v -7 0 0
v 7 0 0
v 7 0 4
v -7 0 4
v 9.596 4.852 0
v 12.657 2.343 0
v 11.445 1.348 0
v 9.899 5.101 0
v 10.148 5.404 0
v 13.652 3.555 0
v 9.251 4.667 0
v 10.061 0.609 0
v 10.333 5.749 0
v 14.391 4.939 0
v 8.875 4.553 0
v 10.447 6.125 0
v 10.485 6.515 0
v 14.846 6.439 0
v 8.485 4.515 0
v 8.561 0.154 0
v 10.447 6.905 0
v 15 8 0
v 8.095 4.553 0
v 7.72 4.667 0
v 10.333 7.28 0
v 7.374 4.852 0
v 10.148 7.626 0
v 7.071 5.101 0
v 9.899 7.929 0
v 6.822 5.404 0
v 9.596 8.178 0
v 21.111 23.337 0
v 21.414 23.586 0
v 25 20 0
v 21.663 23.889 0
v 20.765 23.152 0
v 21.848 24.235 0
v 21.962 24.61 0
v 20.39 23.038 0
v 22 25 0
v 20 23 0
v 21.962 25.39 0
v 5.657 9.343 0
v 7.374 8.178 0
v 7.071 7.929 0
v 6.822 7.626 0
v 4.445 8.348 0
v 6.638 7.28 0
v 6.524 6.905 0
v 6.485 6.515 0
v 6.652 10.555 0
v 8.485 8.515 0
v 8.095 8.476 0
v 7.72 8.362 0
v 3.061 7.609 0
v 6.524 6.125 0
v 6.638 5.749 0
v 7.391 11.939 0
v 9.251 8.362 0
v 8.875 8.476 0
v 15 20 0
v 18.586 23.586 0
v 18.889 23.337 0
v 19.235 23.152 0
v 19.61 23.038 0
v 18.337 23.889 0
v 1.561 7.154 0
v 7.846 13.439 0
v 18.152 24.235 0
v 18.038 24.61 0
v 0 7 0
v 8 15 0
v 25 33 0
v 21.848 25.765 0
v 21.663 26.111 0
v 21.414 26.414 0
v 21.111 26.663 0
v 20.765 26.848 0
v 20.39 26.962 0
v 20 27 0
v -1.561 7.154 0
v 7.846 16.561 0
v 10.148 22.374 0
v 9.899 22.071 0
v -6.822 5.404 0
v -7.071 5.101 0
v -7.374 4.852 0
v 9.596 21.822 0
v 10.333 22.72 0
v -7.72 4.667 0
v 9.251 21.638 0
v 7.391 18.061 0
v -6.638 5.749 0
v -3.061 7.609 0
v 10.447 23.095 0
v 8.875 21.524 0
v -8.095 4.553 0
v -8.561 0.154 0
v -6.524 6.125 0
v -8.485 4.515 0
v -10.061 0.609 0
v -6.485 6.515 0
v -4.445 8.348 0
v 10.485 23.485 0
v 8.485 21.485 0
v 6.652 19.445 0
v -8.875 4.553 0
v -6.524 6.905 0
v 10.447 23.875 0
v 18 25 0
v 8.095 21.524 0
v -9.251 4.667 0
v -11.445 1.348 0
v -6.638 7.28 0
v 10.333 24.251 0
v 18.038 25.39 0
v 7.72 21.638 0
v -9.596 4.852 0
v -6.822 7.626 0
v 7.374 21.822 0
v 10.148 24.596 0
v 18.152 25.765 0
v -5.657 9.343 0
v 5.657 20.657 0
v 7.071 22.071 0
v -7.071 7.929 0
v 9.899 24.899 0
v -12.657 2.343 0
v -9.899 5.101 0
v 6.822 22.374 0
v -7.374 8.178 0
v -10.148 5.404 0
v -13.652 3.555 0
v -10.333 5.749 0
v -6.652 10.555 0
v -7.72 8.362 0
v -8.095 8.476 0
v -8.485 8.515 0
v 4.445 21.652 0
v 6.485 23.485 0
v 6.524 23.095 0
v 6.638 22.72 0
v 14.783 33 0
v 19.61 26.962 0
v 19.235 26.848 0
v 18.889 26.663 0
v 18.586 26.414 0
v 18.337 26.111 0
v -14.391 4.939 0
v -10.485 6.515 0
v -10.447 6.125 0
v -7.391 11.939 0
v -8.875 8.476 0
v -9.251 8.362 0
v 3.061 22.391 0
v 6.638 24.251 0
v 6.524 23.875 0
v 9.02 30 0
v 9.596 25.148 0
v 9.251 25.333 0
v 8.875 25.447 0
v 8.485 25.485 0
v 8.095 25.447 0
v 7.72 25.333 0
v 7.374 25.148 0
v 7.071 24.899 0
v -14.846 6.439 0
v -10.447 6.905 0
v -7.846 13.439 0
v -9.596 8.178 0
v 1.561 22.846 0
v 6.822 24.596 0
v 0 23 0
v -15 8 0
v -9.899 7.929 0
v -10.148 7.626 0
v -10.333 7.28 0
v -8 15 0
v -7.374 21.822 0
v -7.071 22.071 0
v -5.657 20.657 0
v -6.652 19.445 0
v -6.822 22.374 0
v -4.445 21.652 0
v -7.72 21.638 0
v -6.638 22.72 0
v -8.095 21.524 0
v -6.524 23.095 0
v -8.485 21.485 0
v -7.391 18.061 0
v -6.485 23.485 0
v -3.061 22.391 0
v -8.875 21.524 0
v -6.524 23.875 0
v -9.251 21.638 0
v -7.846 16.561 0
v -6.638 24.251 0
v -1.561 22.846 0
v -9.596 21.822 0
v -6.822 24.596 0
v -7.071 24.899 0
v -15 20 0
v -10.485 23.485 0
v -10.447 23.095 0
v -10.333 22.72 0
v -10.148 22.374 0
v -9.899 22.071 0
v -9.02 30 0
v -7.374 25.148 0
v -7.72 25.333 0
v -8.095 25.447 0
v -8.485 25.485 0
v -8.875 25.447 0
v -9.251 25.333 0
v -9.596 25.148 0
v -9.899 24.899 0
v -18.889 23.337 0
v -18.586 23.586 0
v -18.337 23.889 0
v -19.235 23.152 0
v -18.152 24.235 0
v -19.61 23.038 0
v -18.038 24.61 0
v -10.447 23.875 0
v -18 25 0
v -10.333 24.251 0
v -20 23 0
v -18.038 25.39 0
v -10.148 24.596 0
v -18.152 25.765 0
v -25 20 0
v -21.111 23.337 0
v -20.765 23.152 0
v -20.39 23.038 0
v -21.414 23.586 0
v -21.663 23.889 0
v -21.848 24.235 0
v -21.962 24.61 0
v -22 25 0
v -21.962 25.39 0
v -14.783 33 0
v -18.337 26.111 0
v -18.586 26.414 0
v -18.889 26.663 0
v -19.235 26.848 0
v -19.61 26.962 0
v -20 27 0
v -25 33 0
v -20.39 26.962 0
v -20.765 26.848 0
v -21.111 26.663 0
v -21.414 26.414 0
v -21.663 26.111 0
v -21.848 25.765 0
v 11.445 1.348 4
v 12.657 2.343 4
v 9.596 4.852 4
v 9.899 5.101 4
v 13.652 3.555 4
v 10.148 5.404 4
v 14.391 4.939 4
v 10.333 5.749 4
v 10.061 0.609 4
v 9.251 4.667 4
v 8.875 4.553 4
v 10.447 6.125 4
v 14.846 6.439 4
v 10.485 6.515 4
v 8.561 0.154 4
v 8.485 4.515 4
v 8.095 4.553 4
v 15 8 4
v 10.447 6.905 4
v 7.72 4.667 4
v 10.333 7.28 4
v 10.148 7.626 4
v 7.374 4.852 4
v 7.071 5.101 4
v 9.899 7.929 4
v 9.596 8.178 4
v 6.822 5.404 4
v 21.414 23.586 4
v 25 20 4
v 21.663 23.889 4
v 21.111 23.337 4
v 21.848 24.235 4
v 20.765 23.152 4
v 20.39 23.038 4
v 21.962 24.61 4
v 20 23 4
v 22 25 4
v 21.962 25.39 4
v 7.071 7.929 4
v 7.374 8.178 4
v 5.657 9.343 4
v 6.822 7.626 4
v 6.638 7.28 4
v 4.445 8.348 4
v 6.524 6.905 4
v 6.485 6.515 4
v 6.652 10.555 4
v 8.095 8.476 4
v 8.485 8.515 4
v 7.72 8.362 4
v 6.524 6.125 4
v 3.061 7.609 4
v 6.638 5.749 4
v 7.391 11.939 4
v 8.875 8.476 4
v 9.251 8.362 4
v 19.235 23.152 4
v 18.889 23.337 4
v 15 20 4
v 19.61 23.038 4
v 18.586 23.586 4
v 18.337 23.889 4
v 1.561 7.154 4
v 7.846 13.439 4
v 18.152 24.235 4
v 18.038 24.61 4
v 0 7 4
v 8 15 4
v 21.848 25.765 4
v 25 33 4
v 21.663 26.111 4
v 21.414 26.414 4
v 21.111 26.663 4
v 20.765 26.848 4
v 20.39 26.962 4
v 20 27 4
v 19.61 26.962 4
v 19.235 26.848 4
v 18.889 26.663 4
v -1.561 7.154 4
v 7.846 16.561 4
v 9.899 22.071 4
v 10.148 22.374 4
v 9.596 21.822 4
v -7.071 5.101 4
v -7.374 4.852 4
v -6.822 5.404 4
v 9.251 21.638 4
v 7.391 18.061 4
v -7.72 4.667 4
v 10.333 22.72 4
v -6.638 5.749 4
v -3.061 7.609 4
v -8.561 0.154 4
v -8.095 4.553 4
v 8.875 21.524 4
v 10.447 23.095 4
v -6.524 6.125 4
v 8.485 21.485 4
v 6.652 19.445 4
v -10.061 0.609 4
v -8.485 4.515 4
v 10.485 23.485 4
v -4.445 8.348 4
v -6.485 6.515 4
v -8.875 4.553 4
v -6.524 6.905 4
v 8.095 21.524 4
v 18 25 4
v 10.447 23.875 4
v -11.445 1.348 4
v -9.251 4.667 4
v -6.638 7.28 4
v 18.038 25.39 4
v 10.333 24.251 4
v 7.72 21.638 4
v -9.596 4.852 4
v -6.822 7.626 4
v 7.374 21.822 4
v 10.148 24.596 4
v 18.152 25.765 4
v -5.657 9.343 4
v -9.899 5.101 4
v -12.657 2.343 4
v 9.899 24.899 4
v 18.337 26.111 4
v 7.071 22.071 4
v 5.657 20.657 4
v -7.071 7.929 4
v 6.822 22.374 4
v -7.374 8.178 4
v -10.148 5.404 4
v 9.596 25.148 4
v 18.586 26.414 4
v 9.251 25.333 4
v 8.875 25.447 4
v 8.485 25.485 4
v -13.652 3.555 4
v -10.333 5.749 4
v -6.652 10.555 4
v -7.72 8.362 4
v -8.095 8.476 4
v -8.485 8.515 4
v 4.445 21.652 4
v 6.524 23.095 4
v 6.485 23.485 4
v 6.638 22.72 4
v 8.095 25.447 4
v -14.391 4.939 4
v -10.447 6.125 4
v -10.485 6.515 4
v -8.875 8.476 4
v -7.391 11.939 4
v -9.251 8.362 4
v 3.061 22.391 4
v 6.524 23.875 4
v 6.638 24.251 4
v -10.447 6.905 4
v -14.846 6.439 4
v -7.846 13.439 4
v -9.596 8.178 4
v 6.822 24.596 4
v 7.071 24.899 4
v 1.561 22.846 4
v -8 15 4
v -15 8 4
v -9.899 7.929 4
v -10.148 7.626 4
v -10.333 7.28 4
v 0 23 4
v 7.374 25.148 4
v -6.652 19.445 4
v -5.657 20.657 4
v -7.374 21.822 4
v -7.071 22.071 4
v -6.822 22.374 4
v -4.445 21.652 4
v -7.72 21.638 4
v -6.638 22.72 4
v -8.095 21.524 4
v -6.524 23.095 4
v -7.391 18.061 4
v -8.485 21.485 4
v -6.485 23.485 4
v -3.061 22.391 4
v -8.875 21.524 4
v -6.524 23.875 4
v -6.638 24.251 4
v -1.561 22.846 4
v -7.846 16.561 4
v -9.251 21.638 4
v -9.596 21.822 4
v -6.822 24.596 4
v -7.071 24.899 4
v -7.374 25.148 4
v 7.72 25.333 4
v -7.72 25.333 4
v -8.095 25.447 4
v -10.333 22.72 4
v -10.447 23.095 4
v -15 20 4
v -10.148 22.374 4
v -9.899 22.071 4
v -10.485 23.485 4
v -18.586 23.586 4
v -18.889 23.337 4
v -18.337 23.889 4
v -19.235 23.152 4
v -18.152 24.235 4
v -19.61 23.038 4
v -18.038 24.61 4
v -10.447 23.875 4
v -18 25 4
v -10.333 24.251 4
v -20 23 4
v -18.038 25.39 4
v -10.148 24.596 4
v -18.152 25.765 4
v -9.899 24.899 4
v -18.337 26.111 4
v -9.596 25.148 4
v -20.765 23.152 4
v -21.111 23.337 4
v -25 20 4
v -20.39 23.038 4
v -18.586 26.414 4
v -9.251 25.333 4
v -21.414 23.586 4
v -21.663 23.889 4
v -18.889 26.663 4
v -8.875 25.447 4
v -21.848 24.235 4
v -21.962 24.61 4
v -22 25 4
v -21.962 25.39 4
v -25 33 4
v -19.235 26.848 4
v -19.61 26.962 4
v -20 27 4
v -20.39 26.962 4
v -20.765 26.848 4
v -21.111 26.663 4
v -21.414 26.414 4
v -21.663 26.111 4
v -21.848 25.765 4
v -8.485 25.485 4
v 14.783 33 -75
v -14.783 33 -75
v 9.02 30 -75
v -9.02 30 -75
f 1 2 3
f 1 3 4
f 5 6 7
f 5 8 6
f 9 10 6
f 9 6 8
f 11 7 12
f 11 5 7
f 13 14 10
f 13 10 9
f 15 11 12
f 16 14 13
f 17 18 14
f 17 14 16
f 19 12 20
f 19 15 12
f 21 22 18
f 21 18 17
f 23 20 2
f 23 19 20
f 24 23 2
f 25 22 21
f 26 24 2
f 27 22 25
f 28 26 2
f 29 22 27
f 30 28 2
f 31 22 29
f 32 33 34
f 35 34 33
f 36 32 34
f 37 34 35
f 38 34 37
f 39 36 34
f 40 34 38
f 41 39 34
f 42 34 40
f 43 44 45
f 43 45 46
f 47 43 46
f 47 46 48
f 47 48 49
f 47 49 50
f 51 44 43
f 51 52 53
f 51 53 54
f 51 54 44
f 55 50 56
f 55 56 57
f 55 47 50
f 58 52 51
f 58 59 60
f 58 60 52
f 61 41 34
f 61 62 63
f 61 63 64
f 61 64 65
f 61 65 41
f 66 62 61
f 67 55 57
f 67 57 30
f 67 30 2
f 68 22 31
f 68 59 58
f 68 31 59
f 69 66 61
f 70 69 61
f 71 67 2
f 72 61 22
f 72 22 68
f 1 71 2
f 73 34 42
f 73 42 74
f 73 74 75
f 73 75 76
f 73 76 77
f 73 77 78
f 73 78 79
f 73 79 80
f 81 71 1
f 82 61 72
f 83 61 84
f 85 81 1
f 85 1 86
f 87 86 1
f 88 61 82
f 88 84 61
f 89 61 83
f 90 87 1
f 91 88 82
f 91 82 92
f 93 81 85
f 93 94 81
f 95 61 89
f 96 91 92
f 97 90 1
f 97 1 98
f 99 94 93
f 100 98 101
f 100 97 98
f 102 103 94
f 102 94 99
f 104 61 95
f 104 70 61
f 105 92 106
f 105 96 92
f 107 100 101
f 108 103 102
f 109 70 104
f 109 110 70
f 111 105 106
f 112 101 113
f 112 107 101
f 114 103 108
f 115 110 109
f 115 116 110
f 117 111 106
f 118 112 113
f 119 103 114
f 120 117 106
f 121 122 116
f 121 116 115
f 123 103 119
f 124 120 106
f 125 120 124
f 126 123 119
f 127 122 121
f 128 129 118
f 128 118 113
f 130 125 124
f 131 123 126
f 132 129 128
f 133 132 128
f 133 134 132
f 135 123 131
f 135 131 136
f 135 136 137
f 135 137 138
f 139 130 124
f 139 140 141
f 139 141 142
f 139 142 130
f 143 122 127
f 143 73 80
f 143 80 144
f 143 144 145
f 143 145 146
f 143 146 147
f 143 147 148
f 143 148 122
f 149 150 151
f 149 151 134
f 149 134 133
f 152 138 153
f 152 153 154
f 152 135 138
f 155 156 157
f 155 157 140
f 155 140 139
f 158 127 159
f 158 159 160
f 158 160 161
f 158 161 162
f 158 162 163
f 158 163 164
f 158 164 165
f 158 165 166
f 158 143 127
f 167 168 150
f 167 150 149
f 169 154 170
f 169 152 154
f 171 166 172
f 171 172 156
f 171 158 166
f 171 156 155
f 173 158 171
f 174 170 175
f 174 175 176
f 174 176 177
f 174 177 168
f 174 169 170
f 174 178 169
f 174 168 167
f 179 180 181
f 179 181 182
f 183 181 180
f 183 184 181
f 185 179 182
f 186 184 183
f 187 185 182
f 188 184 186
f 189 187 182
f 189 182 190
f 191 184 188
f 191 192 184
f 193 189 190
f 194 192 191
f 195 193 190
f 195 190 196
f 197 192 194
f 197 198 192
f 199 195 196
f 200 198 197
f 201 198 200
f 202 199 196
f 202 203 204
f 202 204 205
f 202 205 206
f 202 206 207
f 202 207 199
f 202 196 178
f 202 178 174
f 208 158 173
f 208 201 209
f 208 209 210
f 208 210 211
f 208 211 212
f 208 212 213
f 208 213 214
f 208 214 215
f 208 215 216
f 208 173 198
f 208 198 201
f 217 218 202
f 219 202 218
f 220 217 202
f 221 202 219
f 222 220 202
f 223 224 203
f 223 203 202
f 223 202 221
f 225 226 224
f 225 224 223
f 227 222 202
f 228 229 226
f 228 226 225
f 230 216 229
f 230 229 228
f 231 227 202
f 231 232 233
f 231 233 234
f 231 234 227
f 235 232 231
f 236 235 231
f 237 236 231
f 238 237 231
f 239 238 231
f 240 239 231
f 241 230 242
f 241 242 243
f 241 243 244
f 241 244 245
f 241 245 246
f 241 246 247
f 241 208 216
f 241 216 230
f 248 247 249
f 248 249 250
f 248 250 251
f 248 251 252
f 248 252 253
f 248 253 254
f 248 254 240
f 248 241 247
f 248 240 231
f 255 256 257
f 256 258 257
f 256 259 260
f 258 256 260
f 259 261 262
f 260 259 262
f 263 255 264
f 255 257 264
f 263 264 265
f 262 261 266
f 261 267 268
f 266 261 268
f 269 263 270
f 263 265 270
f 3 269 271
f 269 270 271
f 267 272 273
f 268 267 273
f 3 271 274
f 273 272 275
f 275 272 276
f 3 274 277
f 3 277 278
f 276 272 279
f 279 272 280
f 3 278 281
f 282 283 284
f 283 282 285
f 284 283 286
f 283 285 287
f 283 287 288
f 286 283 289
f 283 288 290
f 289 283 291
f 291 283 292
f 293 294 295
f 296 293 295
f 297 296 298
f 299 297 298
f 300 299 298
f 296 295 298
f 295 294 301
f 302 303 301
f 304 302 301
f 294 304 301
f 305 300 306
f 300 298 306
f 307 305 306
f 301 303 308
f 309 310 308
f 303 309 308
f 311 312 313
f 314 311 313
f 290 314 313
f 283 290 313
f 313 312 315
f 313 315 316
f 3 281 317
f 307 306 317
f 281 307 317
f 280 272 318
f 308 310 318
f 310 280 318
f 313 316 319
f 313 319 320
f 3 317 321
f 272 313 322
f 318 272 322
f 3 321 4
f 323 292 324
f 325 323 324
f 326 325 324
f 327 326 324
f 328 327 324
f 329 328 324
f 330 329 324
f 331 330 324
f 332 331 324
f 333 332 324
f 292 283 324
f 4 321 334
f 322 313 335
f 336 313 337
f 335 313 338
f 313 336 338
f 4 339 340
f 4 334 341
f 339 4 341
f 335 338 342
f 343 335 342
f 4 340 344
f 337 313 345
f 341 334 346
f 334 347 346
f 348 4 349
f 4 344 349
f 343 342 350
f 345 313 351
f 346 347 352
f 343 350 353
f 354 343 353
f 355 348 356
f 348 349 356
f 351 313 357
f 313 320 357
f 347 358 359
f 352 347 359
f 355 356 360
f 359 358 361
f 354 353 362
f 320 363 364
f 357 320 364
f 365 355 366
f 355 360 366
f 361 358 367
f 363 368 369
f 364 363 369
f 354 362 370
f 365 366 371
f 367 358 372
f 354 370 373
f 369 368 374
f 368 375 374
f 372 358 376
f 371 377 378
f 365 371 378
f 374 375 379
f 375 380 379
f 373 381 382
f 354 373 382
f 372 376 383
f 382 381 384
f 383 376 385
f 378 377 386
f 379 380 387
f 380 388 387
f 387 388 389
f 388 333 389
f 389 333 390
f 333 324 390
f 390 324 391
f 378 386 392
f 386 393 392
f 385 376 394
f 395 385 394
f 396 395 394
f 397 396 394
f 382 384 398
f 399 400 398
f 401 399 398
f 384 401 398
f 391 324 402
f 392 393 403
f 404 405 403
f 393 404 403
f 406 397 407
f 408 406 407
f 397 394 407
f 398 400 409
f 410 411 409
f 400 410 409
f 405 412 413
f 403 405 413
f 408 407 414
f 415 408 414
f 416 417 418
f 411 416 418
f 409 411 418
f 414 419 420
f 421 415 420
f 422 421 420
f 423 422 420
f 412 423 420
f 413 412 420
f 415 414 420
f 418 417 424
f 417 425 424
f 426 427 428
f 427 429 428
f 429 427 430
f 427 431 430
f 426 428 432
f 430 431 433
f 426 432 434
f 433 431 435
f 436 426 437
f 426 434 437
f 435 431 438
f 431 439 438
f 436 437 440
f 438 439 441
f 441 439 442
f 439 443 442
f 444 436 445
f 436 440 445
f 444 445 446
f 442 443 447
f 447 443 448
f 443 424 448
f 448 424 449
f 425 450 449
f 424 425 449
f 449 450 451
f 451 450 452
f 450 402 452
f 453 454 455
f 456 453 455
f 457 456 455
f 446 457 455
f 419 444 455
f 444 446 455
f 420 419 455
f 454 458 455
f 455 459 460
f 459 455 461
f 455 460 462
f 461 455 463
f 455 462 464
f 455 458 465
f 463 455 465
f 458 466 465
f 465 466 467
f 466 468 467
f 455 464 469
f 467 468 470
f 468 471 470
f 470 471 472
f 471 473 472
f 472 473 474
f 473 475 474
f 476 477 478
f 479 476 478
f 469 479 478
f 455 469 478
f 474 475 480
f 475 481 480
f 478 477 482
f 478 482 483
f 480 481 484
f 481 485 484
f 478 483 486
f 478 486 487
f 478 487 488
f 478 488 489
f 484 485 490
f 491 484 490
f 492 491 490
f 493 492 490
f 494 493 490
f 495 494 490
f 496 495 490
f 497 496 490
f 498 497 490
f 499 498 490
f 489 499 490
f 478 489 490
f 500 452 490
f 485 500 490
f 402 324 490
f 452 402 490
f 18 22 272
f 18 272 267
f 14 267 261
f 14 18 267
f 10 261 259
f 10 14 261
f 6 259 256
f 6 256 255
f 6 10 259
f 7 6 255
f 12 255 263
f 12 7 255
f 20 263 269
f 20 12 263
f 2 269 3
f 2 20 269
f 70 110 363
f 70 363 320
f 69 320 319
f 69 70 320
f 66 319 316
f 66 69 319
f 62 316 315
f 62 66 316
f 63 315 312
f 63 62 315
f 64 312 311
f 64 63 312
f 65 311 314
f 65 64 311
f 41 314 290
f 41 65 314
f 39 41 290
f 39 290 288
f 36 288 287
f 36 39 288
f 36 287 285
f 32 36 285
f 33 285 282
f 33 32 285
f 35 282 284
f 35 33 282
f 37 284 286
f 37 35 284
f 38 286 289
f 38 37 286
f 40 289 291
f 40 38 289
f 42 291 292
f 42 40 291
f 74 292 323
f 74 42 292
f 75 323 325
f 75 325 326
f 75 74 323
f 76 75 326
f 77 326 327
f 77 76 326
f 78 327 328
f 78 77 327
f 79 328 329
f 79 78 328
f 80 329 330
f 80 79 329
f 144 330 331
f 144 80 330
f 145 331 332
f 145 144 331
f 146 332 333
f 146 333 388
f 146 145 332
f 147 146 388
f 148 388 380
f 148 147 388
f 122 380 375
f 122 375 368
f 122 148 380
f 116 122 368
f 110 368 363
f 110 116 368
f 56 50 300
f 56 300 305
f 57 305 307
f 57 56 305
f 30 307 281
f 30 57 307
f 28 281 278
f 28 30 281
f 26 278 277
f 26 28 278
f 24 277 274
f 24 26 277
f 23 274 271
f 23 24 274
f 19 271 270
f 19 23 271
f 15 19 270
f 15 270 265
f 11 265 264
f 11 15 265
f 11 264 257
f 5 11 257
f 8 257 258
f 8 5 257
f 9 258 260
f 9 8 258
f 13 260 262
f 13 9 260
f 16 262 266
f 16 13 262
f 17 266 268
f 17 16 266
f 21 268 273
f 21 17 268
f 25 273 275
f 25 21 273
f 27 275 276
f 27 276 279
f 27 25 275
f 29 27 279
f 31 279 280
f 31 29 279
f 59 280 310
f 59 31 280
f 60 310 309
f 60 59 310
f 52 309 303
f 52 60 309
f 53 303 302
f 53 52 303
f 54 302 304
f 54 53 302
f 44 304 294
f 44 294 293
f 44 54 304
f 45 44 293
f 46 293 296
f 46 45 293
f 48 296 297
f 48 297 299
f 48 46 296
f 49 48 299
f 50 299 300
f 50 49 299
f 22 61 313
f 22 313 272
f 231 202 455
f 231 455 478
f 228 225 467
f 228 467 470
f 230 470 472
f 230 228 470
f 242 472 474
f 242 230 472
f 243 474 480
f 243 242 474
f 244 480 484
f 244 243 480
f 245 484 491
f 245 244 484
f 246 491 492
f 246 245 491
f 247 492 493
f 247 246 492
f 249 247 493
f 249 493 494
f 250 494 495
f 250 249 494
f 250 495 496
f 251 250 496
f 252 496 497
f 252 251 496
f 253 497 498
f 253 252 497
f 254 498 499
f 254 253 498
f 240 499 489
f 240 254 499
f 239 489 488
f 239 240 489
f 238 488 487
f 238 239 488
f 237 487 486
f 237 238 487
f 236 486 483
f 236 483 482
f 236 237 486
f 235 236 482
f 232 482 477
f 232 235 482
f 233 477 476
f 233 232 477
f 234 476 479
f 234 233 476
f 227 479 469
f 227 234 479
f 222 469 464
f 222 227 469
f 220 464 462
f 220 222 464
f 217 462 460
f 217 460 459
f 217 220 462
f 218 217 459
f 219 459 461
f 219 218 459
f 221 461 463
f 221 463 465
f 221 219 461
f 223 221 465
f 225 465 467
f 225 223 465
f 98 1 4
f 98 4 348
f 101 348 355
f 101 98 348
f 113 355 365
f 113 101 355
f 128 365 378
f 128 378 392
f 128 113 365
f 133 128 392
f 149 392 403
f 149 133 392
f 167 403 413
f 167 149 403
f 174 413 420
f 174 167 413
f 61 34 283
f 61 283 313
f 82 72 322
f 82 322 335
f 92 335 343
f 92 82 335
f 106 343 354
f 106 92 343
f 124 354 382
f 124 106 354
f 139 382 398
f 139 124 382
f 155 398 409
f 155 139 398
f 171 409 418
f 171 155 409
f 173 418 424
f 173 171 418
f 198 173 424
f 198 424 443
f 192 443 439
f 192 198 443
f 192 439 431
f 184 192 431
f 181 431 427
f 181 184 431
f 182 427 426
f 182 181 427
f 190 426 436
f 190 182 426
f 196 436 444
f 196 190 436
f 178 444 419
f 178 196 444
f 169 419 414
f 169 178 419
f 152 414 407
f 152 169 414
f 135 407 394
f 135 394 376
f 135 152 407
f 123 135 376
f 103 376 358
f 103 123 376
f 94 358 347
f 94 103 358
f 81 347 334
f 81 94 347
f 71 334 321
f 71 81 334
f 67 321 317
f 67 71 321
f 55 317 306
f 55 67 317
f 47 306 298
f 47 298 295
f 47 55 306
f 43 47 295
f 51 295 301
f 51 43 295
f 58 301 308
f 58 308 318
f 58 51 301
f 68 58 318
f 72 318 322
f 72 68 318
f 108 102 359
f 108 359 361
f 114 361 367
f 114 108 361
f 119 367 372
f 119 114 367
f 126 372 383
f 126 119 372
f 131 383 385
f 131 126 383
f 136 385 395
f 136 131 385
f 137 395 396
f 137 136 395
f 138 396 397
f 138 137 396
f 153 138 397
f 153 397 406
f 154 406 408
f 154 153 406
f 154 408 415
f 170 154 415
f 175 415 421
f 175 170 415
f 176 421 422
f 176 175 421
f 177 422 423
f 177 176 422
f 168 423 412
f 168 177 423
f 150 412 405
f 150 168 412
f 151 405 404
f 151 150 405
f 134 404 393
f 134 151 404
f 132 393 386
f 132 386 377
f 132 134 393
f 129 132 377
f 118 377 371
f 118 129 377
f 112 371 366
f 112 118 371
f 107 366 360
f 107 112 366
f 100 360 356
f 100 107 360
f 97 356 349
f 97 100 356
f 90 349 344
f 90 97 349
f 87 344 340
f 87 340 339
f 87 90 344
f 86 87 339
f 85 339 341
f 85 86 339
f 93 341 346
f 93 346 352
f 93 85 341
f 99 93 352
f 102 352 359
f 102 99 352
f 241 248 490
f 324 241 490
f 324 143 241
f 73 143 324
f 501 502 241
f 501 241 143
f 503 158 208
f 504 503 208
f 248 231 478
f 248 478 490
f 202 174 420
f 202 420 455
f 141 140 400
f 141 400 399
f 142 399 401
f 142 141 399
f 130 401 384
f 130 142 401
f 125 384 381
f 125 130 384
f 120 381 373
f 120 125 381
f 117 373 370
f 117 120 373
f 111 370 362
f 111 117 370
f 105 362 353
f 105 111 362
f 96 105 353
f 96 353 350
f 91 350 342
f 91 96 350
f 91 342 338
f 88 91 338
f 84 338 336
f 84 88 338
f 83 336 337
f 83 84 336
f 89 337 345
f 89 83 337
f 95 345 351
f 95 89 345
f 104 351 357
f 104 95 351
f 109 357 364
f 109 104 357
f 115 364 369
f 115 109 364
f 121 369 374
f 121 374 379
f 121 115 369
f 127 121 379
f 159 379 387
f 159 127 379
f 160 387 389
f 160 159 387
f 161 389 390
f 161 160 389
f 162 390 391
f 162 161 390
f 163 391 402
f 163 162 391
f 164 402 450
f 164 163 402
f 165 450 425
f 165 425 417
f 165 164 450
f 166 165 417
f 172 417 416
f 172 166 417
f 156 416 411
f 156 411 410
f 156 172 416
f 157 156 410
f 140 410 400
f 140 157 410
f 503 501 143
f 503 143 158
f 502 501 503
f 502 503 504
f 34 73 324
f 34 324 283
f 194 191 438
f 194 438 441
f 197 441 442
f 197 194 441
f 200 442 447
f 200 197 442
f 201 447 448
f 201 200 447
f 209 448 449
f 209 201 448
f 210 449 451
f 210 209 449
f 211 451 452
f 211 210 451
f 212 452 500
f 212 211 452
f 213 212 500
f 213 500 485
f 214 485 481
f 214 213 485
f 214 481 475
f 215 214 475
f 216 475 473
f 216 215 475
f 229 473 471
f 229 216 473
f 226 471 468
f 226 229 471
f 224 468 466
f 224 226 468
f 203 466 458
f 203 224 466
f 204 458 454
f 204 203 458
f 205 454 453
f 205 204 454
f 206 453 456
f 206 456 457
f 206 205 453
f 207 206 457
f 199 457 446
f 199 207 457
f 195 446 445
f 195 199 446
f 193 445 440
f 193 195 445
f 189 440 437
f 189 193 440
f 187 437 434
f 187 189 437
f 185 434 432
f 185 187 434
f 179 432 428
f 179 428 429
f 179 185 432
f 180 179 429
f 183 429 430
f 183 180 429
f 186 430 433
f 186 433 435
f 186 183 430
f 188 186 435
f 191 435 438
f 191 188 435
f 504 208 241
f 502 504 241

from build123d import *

# Parameters (mm, degrees)
CROQUIS1_R              = 8
CROQUIS1_R_2            = 2
SALIENTE_EXTRUIR1_DEPTH = 4
SALIENTE_EXTRUIR2_DEPTH = 75


with BuildPart() as part:
    # Croquis1 → Saliente-Extruir1 (new body)
    with BuildSketch(Plane.XY):
        with BuildLine():
            Line((-25, 33), (25, 33))
            Line((25, 33), (25, 20))
            Line((25, 20), (15, 20))
            Line((15, 20), (15, 8))
            ThreePointArc((15, 8), (12.656854249, 2.343145751), (7, 0))
            Line((7, 0), (-7, 0))
            ThreePointArc((-7, 0), (-12.656854249, 2.343145751), (-15, 8))
            Line((-15, 8), (-15, 20))
            Line((-15, 20), (-25, 20))
            Line((-25, 20), (-25, 33))
        make_face()
        with Locations((0, 15)):
            Circle(CROQUIS1_R, mode=Mode.SUBTRACT)
        with Locations((-8.485281374, 6.514718626)):
            Circle(CROQUIS1_R_2, mode=Mode.SUBTRACT)
        with Locations((-8.485281374, 23.485281374)):
            Circle(CROQUIS1_R_2, mode=Mode.SUBTRACT)
        with Locations((-20, 25)):
            Circle(CROQUIS1_R_2, mode=Mode.SUBTRACT)
        with Locations(Location((8.485281374, 6.514718626, 0), (0, 0, 180))):
            Circle(CROQUIS1_R_2, mode=Mode.SUBTRACT)
        with Locations(Location((8.485281374, 23.485281374, 0), (0, 0, 180))):
            Circle(CROQUIS1_R_2, mode=Mode.SUBTRACT)
        with Locations(Location((20, 25, 0), (0, 0, 180))):
            Circle(CROQUIS1_R_2, mode=Mode.SUBTRACT)
    extrude(amount=SALIENTE_EXTRUIR1_DEPTH)

    # Croquis2 → Saliente-Extruir2 (add)
    with BuildSketch(Plane(origin=(0, 0, 0), x_dir=(-1, 0, 0), z_dir=(0, 0, -1))):
        Polygon((14.783431943, 33), (-14.783431943, 33), (-9.020485562, 30), (9.020485562, 30), align=None)
    extrude(amount=SALIENTE_EXTRUIR2_DEPTH)


solid = part.part
